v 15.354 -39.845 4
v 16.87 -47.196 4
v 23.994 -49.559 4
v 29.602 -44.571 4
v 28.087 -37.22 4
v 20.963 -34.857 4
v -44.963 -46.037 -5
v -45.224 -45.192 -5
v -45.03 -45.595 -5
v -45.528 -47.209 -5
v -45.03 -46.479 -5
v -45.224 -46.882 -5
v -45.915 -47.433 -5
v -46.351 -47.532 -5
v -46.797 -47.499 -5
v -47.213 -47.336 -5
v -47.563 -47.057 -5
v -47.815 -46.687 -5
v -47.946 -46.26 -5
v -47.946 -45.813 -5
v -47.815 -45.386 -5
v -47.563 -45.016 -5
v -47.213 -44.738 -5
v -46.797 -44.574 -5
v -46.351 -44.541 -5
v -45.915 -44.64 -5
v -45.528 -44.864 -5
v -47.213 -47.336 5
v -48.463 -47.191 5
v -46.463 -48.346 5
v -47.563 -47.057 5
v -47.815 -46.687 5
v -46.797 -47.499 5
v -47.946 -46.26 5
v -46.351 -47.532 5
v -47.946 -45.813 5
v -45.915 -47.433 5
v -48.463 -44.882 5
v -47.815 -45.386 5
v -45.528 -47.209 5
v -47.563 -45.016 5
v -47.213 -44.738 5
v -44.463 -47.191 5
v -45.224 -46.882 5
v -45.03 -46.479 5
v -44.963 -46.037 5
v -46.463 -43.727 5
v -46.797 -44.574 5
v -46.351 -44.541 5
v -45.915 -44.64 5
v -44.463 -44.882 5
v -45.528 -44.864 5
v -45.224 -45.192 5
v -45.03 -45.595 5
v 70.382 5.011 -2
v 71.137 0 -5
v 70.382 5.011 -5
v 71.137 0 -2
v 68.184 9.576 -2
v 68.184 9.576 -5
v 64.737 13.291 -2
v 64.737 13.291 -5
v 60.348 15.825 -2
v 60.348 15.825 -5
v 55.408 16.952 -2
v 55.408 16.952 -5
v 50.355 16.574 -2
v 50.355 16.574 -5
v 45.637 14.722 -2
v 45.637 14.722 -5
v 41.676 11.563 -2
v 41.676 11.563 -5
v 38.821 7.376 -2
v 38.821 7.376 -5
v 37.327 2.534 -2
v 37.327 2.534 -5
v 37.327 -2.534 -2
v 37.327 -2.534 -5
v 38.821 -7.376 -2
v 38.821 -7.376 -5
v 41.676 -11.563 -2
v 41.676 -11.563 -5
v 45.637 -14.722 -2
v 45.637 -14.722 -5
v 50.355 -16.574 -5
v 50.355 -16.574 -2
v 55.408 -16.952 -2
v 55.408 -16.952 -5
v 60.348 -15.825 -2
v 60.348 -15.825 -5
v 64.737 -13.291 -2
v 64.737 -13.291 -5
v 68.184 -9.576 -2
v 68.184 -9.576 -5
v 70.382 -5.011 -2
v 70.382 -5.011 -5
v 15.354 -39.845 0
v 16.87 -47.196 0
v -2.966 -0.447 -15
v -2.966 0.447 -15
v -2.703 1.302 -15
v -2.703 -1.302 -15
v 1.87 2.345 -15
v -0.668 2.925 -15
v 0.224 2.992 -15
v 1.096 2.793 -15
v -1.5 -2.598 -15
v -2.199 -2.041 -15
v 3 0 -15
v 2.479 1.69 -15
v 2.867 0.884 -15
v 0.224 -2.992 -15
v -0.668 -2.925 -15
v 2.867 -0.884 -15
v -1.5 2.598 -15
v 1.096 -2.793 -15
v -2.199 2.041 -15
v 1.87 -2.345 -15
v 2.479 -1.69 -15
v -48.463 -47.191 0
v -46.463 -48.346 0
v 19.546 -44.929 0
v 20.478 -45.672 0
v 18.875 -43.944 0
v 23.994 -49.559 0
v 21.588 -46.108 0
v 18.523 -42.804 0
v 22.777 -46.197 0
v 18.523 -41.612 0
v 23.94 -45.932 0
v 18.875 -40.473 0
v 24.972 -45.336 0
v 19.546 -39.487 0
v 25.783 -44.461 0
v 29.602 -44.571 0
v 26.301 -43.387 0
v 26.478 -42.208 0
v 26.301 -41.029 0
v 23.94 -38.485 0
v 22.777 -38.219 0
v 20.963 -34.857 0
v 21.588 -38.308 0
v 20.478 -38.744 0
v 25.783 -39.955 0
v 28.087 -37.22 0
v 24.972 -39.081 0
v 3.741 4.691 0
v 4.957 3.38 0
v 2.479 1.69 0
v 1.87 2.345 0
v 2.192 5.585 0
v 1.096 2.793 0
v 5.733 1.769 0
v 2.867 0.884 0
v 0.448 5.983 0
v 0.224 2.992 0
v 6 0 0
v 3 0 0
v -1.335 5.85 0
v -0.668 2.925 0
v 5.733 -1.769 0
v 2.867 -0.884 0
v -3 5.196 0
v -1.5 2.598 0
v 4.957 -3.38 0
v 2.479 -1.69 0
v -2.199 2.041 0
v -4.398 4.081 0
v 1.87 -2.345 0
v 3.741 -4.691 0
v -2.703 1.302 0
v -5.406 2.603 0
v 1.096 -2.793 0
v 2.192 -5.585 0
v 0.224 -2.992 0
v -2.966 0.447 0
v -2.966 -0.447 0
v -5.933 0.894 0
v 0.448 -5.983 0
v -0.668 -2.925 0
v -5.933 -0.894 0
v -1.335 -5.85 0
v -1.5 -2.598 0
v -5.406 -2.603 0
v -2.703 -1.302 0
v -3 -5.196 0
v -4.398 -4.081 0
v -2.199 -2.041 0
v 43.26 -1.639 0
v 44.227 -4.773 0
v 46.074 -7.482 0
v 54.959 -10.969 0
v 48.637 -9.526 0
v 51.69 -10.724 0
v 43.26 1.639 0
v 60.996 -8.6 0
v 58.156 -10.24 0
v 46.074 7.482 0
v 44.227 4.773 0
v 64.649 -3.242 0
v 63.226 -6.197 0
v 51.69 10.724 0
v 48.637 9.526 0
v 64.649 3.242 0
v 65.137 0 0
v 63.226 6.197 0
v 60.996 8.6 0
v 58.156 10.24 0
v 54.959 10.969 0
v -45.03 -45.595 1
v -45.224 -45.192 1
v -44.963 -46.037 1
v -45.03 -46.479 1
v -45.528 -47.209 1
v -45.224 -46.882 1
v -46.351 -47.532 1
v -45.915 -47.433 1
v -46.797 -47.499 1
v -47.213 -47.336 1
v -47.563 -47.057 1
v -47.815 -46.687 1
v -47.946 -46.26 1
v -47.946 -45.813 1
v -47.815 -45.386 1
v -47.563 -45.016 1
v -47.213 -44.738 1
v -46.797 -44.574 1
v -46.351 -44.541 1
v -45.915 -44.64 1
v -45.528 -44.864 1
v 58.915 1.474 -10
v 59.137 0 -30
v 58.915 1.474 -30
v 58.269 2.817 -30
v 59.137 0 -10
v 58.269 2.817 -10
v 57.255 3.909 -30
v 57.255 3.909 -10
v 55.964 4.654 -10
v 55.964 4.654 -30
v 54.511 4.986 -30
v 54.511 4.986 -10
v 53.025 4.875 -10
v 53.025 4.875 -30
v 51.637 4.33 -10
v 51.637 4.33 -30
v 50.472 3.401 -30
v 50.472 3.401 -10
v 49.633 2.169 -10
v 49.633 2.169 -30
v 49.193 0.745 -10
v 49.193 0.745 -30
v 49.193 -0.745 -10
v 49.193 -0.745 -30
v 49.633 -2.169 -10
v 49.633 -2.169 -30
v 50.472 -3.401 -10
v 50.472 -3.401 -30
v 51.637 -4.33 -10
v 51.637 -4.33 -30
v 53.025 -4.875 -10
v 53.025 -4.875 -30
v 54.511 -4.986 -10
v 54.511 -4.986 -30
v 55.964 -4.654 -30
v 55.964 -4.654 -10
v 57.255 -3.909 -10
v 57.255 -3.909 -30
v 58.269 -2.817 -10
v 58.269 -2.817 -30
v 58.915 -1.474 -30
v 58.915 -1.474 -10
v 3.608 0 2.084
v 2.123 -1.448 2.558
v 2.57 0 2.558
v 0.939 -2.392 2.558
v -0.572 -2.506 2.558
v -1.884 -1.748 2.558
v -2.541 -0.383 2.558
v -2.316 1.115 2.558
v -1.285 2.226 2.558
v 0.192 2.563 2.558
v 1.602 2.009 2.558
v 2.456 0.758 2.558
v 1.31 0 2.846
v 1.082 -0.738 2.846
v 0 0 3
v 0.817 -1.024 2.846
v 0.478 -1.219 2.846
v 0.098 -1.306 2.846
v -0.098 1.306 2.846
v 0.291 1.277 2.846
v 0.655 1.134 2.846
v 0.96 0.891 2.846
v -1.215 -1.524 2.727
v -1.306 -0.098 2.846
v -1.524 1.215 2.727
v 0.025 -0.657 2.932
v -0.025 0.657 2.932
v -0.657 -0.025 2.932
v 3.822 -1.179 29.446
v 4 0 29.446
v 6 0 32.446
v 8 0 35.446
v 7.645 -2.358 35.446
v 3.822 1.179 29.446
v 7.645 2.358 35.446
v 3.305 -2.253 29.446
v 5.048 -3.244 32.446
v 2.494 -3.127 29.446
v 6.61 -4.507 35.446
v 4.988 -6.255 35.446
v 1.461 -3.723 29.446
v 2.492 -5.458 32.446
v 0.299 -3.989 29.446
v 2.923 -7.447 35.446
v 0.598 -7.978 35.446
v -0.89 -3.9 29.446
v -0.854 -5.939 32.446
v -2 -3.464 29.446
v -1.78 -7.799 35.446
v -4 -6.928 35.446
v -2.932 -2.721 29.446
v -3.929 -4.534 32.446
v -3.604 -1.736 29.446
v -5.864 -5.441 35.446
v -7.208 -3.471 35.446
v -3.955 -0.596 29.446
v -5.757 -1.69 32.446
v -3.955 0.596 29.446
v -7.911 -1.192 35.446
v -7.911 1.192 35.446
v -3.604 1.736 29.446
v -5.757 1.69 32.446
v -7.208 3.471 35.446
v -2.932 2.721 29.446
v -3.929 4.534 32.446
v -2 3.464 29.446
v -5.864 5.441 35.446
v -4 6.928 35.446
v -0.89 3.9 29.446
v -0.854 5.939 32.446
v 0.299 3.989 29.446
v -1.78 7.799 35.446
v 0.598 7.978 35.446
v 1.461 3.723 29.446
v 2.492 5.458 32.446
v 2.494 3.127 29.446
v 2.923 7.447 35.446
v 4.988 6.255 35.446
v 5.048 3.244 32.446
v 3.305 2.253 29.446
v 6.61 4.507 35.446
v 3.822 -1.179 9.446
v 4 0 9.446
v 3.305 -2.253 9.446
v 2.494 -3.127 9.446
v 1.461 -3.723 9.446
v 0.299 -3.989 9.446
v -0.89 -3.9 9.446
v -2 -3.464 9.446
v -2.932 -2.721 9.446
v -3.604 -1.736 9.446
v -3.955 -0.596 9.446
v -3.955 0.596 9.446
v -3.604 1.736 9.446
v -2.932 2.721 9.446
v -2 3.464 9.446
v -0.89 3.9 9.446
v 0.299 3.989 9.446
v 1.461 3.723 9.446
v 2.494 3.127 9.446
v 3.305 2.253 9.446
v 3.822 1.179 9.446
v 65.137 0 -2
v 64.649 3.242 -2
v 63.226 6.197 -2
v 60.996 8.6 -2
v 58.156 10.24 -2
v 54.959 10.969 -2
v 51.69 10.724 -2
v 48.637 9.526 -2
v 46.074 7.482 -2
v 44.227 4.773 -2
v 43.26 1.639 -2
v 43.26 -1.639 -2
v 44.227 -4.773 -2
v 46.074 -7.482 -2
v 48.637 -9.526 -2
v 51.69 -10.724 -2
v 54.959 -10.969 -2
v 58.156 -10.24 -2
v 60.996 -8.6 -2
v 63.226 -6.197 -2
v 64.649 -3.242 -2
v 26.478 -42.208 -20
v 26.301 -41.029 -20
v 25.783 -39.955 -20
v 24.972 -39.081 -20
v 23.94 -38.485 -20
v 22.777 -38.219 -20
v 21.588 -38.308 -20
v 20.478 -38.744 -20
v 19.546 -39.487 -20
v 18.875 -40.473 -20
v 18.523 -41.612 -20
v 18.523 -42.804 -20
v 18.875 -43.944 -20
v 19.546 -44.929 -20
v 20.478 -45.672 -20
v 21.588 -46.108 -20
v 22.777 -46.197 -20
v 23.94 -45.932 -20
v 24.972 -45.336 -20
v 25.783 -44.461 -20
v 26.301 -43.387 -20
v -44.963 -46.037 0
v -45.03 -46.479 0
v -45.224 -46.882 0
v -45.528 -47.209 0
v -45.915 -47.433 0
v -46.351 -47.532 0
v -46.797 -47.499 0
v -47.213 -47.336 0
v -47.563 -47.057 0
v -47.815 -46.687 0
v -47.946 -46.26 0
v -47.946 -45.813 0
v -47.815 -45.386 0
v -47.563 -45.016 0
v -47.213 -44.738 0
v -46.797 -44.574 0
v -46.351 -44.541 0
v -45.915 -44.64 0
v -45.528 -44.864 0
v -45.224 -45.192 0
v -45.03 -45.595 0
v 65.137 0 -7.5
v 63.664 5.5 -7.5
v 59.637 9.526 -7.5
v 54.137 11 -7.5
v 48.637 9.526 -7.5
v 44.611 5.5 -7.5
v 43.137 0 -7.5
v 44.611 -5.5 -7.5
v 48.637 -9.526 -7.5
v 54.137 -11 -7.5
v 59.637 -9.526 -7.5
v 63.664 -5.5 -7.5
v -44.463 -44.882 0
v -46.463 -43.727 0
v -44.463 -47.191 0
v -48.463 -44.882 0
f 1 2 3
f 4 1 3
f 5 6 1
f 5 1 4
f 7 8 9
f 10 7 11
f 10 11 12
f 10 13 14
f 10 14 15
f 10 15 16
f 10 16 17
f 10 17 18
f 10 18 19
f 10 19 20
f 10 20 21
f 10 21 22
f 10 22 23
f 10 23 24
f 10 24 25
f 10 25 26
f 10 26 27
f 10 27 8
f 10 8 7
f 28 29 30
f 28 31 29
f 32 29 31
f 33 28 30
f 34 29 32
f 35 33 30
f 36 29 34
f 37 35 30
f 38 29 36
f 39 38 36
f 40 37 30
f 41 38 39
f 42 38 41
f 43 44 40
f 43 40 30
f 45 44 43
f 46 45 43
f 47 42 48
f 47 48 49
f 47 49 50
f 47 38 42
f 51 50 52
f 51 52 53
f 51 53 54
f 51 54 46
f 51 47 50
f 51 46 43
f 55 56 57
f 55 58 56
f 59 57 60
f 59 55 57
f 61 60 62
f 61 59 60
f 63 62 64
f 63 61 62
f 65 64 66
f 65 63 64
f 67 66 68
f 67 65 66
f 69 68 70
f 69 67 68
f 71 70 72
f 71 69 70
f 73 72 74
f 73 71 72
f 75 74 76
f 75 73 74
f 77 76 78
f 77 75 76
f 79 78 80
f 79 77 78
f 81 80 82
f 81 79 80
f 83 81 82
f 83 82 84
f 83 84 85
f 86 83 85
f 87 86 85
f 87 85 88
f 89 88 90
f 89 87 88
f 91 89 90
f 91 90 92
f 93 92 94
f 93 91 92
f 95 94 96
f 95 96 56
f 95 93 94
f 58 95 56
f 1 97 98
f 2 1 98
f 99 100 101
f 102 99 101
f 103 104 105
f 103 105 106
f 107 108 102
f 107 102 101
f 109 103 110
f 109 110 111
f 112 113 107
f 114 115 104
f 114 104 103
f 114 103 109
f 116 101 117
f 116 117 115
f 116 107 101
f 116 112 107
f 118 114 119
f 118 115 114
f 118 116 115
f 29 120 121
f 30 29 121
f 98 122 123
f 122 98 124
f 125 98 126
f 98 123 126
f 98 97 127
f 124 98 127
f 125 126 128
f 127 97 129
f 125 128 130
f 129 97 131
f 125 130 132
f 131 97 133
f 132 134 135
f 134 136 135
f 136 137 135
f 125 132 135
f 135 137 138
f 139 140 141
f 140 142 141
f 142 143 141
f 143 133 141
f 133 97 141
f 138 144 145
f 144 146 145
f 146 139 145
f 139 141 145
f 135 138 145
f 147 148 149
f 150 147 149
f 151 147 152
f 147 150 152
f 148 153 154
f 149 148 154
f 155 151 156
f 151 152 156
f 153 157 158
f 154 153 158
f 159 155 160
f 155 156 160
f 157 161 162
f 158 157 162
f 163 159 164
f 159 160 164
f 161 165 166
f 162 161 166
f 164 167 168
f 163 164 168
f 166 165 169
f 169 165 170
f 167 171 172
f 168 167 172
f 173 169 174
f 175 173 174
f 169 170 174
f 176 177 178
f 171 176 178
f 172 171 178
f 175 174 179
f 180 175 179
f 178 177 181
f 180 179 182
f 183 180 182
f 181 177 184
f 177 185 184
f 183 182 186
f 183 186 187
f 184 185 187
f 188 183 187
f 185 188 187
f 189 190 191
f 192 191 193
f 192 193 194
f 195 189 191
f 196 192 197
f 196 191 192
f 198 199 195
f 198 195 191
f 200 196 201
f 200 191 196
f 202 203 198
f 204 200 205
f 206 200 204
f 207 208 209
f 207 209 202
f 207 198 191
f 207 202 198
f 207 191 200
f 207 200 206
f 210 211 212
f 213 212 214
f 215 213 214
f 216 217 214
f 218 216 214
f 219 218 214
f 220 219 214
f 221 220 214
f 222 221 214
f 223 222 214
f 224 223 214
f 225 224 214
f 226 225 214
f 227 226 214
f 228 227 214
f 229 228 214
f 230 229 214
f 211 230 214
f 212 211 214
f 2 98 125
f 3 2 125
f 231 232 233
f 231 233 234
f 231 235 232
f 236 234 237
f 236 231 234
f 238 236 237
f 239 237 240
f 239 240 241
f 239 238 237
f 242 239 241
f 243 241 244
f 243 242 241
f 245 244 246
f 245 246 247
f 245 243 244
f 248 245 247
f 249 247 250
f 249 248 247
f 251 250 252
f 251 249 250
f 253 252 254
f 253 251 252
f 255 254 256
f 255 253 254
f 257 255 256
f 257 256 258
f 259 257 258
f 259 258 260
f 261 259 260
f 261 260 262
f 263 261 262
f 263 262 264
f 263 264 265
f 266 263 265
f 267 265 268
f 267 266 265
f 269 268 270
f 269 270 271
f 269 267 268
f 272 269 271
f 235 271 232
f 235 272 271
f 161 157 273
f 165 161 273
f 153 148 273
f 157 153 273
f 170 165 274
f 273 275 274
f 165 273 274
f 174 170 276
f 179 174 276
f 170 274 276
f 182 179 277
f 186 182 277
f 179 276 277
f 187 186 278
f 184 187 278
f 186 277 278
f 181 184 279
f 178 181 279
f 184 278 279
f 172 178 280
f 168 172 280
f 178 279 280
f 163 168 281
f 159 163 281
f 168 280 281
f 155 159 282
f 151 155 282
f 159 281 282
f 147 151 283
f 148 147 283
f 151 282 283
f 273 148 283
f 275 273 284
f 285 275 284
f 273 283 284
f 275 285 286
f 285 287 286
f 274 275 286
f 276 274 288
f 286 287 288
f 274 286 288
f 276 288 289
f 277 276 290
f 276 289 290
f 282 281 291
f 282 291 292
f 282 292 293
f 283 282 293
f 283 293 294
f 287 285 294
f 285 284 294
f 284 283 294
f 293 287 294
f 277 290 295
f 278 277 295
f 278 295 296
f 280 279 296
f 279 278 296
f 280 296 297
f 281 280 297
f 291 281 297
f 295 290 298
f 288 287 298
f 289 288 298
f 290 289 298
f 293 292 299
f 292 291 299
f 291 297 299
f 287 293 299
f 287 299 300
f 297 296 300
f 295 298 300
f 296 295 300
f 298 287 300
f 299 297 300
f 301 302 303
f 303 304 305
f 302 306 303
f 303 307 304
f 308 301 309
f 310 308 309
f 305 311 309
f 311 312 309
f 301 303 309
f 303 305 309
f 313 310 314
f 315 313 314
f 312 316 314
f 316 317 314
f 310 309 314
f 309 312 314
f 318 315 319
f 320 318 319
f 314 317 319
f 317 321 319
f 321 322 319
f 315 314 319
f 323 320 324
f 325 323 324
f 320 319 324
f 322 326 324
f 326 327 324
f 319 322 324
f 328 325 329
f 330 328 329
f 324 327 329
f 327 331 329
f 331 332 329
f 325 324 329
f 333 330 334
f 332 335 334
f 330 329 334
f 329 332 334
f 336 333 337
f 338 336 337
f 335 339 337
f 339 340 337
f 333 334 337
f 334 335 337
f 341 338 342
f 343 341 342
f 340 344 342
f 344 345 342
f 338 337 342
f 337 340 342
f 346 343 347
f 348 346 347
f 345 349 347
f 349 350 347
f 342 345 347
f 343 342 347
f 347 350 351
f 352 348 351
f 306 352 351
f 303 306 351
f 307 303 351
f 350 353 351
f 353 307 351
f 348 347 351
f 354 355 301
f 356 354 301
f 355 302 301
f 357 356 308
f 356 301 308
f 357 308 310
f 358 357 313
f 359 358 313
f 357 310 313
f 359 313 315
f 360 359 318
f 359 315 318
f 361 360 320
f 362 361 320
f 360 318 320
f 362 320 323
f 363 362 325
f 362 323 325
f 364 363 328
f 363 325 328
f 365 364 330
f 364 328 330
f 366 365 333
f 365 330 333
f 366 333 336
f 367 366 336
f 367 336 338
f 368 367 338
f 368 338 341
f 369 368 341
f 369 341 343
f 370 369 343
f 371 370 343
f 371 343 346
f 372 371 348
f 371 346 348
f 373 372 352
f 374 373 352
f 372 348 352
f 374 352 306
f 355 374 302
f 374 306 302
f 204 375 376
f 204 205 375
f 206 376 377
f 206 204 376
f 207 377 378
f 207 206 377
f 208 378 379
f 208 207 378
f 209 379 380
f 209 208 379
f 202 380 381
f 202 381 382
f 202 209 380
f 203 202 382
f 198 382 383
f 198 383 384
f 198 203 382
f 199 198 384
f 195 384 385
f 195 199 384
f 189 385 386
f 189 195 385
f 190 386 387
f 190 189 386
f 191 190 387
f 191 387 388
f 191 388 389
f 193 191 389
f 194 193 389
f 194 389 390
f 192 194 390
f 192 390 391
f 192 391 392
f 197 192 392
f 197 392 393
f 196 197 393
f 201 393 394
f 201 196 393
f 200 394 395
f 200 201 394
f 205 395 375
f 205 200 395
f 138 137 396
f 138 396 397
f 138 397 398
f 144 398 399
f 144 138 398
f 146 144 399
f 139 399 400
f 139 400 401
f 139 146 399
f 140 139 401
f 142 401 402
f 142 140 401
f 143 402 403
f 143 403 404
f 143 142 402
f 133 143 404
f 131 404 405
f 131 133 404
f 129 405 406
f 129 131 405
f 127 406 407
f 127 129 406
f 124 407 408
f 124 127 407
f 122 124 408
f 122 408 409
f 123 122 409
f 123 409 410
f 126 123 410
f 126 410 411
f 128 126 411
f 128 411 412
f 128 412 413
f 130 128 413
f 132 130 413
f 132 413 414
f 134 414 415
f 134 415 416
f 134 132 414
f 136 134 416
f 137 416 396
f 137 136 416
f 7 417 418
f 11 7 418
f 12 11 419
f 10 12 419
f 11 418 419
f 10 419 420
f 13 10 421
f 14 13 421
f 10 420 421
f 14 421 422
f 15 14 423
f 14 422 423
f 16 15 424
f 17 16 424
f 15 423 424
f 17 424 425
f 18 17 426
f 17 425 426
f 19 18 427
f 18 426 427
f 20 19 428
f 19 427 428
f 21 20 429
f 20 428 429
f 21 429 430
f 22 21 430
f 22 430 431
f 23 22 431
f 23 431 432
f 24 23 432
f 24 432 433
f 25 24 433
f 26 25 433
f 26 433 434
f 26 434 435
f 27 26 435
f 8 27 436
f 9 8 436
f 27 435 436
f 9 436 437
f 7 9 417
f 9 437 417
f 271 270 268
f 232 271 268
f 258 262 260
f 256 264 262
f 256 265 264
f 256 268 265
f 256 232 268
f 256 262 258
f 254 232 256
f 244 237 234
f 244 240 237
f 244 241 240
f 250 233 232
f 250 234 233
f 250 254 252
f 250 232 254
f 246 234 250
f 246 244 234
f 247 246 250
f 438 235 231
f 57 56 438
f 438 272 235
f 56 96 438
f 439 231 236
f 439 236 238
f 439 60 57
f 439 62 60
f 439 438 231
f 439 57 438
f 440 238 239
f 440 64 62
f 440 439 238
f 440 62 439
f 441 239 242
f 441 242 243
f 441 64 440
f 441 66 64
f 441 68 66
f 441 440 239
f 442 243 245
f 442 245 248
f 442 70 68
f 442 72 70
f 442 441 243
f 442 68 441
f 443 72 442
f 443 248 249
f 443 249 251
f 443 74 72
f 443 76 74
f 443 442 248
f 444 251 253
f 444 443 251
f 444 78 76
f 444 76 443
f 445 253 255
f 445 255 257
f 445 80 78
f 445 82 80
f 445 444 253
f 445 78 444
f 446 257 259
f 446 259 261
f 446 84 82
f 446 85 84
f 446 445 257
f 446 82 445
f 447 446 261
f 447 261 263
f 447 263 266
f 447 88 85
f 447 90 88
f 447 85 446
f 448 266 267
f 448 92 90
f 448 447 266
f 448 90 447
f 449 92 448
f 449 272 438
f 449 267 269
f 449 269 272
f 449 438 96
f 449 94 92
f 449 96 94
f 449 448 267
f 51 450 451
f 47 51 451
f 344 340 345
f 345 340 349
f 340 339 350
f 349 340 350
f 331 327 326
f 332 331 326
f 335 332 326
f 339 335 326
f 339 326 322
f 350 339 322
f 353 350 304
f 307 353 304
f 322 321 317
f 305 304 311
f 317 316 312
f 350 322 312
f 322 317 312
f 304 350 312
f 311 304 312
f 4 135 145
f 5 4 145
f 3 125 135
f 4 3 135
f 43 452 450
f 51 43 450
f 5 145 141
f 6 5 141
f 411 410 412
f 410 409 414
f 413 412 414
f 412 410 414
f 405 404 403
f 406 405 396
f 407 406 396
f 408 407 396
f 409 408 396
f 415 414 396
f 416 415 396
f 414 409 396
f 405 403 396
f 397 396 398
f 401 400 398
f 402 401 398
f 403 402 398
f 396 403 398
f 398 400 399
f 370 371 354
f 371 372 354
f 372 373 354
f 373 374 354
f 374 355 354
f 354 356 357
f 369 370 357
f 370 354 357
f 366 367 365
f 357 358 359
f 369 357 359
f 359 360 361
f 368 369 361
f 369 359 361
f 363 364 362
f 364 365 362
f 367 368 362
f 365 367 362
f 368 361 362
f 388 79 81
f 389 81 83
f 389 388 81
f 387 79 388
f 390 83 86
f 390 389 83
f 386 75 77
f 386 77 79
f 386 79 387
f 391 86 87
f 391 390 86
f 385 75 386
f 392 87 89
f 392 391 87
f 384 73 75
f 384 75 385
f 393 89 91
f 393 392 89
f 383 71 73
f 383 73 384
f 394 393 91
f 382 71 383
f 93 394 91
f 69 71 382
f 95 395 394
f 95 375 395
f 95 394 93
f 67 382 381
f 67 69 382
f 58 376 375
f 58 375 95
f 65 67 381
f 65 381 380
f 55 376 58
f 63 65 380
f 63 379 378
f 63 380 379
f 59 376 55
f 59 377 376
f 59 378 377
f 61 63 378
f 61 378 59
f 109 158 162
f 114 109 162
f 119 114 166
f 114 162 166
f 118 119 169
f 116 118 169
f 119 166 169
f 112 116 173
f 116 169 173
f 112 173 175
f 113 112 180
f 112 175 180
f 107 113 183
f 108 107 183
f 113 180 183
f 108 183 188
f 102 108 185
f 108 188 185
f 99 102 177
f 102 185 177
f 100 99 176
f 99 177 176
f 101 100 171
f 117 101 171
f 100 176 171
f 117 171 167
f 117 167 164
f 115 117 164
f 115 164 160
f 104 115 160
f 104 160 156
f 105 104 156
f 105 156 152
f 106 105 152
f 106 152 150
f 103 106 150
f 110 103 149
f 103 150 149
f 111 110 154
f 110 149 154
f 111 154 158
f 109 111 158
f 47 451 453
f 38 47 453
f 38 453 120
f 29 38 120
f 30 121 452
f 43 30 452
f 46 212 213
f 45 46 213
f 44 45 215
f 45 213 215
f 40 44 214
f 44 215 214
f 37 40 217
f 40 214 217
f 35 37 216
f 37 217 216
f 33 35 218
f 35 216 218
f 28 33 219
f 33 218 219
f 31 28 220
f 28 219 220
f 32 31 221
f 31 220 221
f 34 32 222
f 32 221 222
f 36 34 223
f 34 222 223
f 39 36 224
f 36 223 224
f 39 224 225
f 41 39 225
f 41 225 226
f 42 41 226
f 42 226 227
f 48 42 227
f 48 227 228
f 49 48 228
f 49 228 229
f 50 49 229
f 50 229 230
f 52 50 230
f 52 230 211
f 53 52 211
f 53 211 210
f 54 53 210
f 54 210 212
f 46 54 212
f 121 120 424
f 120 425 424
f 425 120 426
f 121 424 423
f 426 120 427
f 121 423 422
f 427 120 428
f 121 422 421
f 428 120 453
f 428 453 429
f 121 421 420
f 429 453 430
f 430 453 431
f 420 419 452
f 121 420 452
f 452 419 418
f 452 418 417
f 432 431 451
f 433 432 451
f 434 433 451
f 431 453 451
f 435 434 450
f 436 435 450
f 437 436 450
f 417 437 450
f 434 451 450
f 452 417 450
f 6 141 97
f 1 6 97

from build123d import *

# Parameters (mm, degrees)
F2_R           = 3
F3_DEPTH       = 15
F6_R           = 4
F7_DEPTH       = 20
F9_DEPTH       = 4
F11_DEPTH      = 5
F12_R          = 1.5
F13_DEPTH      = 6
F14_DEPTH      = 5
F14_DEPTH_BACK = 1


with BuildPart() as f1:
    # F0 (on Front) → F1 (revolve)
    with BuildSketch(Plane.XZ):
        with BuildLine():
            add(Edge.make_bspline(
                [(6, 0), (5.1182094803, 0.9014976906), (3.3967041799, 2.6614769805), (1.1136343677, 2.8890127462), (0, 3)],
                knots=[0, 0, 0, 0, 0.5122206243, 1, 1, 1, 1], degree=3))
            Line((0, 3), (0, 0))
            Line((0, 0), (6, 0))
        make_face()
    revolve(axis=Axis((0, 0, -0.1887138933), (0, 0, -1)))

    # F2 (on face) → F3 (join)
    with BuildSketch(Plane(origin=(0, 0, 0), x_dir=(1, 0, 0), z_dir=(0, 0, -1))):
        Circle(F2_R)
    extrude(amount=F3_DEPTH)


with BuildPart() as f5:
    # F4 (on Front) → F5 (revolve)
    with BuildSketch(Plane.XZ):
        Polygon((8, 35.4456133136), (0, 35.4456133136), (0, 9.4456133136), (4, 9.4456133136), (4, 29.4456133136), align=None)
    revolve(axis=Axis((0, 0, 22.4456133136), (0, 0, -1)))


with BuildPart() as f7:
    # F6 (on Top) → F7 (new body)
    with BuildSketch(Plane.XY):
        with Locations((22.4784184247, -42.2081761062)):
            Circle(F6_R)
    extrude(amount=-F7_DEPTH)

    # F8 (on face) → F9 (join)
    with BuildSketch(Plane.XY):
        Polygon((20.96271244, -34.8572599251), (15.3544852785, -39.8453579031), (16.8701912632, -47.1962740842), (23.9941244094, -49.5590922873), (29.602351571, -44.5709943093), (28.0866455863, -37.2200781282), align=None)
    extrude(amount=F9_DEPTH)


with BuildPart() as f11:
    # F10 (on Top) → F11 (new body)
    with BuildSketch(Plane.XY):
        Polygon((-44.4631840587, -47.191353759), (-44.4631840587, -44.8819526823), (-46.4631840587, -43.7272521439), (-48.4631840587, -44.8819526823), (-48.4631840587, -47.191353759), (-46.4631840587, -48.3460542974), align=None)
    extrude(amount=F11_DEPTH)

    # F12 (on face) → F13 (cut)
    with BuildSketch(Plane(origin=(0, 0, 0), x_dir=(1, 0, 0), z_dir=(0, 0, -1))):
        with Locations((-46.4631840587, 46.0366532207)):
            Circle(F12_R)
    extrude(amount=-F13_DEPTH, mode=Mode.SUBTRACT)

    # F12 (on face) → F14 (join, two sides)
    with BuildSketch(Plane(origin=(0, 0, 0), x_dir=(1, 0, 0), z_dir=(0, 0, -1))) as f14_sk:
        with Locations((-46.4631840587, 46.0366532207)):
            Circle(F12_R)
    extrude(amount=F14_DEPTH)
    extrude(f14_sk.sketch, amount=-F14_DEPTH_BACK)


with BuildPart() as f16:
    # F15 (on Front) → F16 (revolve)
    with BuildSketch(Plane.XZ):
        Polygon((65.1374427022, 0), (54.1374427022, 0), (54.1374427022, -30), (59.1374427022, -30), (59.1374427022, -10), (71.1374427022, -5), (71.1374427022, -2), (65.1374427022, -2), align=None)
    revolve(axis=Axis((54.1374427022, 0, -15), (0, 0, 1)))


solid = Compound([f1.part, f5.part, f7.part, f11.part, f16.part])
